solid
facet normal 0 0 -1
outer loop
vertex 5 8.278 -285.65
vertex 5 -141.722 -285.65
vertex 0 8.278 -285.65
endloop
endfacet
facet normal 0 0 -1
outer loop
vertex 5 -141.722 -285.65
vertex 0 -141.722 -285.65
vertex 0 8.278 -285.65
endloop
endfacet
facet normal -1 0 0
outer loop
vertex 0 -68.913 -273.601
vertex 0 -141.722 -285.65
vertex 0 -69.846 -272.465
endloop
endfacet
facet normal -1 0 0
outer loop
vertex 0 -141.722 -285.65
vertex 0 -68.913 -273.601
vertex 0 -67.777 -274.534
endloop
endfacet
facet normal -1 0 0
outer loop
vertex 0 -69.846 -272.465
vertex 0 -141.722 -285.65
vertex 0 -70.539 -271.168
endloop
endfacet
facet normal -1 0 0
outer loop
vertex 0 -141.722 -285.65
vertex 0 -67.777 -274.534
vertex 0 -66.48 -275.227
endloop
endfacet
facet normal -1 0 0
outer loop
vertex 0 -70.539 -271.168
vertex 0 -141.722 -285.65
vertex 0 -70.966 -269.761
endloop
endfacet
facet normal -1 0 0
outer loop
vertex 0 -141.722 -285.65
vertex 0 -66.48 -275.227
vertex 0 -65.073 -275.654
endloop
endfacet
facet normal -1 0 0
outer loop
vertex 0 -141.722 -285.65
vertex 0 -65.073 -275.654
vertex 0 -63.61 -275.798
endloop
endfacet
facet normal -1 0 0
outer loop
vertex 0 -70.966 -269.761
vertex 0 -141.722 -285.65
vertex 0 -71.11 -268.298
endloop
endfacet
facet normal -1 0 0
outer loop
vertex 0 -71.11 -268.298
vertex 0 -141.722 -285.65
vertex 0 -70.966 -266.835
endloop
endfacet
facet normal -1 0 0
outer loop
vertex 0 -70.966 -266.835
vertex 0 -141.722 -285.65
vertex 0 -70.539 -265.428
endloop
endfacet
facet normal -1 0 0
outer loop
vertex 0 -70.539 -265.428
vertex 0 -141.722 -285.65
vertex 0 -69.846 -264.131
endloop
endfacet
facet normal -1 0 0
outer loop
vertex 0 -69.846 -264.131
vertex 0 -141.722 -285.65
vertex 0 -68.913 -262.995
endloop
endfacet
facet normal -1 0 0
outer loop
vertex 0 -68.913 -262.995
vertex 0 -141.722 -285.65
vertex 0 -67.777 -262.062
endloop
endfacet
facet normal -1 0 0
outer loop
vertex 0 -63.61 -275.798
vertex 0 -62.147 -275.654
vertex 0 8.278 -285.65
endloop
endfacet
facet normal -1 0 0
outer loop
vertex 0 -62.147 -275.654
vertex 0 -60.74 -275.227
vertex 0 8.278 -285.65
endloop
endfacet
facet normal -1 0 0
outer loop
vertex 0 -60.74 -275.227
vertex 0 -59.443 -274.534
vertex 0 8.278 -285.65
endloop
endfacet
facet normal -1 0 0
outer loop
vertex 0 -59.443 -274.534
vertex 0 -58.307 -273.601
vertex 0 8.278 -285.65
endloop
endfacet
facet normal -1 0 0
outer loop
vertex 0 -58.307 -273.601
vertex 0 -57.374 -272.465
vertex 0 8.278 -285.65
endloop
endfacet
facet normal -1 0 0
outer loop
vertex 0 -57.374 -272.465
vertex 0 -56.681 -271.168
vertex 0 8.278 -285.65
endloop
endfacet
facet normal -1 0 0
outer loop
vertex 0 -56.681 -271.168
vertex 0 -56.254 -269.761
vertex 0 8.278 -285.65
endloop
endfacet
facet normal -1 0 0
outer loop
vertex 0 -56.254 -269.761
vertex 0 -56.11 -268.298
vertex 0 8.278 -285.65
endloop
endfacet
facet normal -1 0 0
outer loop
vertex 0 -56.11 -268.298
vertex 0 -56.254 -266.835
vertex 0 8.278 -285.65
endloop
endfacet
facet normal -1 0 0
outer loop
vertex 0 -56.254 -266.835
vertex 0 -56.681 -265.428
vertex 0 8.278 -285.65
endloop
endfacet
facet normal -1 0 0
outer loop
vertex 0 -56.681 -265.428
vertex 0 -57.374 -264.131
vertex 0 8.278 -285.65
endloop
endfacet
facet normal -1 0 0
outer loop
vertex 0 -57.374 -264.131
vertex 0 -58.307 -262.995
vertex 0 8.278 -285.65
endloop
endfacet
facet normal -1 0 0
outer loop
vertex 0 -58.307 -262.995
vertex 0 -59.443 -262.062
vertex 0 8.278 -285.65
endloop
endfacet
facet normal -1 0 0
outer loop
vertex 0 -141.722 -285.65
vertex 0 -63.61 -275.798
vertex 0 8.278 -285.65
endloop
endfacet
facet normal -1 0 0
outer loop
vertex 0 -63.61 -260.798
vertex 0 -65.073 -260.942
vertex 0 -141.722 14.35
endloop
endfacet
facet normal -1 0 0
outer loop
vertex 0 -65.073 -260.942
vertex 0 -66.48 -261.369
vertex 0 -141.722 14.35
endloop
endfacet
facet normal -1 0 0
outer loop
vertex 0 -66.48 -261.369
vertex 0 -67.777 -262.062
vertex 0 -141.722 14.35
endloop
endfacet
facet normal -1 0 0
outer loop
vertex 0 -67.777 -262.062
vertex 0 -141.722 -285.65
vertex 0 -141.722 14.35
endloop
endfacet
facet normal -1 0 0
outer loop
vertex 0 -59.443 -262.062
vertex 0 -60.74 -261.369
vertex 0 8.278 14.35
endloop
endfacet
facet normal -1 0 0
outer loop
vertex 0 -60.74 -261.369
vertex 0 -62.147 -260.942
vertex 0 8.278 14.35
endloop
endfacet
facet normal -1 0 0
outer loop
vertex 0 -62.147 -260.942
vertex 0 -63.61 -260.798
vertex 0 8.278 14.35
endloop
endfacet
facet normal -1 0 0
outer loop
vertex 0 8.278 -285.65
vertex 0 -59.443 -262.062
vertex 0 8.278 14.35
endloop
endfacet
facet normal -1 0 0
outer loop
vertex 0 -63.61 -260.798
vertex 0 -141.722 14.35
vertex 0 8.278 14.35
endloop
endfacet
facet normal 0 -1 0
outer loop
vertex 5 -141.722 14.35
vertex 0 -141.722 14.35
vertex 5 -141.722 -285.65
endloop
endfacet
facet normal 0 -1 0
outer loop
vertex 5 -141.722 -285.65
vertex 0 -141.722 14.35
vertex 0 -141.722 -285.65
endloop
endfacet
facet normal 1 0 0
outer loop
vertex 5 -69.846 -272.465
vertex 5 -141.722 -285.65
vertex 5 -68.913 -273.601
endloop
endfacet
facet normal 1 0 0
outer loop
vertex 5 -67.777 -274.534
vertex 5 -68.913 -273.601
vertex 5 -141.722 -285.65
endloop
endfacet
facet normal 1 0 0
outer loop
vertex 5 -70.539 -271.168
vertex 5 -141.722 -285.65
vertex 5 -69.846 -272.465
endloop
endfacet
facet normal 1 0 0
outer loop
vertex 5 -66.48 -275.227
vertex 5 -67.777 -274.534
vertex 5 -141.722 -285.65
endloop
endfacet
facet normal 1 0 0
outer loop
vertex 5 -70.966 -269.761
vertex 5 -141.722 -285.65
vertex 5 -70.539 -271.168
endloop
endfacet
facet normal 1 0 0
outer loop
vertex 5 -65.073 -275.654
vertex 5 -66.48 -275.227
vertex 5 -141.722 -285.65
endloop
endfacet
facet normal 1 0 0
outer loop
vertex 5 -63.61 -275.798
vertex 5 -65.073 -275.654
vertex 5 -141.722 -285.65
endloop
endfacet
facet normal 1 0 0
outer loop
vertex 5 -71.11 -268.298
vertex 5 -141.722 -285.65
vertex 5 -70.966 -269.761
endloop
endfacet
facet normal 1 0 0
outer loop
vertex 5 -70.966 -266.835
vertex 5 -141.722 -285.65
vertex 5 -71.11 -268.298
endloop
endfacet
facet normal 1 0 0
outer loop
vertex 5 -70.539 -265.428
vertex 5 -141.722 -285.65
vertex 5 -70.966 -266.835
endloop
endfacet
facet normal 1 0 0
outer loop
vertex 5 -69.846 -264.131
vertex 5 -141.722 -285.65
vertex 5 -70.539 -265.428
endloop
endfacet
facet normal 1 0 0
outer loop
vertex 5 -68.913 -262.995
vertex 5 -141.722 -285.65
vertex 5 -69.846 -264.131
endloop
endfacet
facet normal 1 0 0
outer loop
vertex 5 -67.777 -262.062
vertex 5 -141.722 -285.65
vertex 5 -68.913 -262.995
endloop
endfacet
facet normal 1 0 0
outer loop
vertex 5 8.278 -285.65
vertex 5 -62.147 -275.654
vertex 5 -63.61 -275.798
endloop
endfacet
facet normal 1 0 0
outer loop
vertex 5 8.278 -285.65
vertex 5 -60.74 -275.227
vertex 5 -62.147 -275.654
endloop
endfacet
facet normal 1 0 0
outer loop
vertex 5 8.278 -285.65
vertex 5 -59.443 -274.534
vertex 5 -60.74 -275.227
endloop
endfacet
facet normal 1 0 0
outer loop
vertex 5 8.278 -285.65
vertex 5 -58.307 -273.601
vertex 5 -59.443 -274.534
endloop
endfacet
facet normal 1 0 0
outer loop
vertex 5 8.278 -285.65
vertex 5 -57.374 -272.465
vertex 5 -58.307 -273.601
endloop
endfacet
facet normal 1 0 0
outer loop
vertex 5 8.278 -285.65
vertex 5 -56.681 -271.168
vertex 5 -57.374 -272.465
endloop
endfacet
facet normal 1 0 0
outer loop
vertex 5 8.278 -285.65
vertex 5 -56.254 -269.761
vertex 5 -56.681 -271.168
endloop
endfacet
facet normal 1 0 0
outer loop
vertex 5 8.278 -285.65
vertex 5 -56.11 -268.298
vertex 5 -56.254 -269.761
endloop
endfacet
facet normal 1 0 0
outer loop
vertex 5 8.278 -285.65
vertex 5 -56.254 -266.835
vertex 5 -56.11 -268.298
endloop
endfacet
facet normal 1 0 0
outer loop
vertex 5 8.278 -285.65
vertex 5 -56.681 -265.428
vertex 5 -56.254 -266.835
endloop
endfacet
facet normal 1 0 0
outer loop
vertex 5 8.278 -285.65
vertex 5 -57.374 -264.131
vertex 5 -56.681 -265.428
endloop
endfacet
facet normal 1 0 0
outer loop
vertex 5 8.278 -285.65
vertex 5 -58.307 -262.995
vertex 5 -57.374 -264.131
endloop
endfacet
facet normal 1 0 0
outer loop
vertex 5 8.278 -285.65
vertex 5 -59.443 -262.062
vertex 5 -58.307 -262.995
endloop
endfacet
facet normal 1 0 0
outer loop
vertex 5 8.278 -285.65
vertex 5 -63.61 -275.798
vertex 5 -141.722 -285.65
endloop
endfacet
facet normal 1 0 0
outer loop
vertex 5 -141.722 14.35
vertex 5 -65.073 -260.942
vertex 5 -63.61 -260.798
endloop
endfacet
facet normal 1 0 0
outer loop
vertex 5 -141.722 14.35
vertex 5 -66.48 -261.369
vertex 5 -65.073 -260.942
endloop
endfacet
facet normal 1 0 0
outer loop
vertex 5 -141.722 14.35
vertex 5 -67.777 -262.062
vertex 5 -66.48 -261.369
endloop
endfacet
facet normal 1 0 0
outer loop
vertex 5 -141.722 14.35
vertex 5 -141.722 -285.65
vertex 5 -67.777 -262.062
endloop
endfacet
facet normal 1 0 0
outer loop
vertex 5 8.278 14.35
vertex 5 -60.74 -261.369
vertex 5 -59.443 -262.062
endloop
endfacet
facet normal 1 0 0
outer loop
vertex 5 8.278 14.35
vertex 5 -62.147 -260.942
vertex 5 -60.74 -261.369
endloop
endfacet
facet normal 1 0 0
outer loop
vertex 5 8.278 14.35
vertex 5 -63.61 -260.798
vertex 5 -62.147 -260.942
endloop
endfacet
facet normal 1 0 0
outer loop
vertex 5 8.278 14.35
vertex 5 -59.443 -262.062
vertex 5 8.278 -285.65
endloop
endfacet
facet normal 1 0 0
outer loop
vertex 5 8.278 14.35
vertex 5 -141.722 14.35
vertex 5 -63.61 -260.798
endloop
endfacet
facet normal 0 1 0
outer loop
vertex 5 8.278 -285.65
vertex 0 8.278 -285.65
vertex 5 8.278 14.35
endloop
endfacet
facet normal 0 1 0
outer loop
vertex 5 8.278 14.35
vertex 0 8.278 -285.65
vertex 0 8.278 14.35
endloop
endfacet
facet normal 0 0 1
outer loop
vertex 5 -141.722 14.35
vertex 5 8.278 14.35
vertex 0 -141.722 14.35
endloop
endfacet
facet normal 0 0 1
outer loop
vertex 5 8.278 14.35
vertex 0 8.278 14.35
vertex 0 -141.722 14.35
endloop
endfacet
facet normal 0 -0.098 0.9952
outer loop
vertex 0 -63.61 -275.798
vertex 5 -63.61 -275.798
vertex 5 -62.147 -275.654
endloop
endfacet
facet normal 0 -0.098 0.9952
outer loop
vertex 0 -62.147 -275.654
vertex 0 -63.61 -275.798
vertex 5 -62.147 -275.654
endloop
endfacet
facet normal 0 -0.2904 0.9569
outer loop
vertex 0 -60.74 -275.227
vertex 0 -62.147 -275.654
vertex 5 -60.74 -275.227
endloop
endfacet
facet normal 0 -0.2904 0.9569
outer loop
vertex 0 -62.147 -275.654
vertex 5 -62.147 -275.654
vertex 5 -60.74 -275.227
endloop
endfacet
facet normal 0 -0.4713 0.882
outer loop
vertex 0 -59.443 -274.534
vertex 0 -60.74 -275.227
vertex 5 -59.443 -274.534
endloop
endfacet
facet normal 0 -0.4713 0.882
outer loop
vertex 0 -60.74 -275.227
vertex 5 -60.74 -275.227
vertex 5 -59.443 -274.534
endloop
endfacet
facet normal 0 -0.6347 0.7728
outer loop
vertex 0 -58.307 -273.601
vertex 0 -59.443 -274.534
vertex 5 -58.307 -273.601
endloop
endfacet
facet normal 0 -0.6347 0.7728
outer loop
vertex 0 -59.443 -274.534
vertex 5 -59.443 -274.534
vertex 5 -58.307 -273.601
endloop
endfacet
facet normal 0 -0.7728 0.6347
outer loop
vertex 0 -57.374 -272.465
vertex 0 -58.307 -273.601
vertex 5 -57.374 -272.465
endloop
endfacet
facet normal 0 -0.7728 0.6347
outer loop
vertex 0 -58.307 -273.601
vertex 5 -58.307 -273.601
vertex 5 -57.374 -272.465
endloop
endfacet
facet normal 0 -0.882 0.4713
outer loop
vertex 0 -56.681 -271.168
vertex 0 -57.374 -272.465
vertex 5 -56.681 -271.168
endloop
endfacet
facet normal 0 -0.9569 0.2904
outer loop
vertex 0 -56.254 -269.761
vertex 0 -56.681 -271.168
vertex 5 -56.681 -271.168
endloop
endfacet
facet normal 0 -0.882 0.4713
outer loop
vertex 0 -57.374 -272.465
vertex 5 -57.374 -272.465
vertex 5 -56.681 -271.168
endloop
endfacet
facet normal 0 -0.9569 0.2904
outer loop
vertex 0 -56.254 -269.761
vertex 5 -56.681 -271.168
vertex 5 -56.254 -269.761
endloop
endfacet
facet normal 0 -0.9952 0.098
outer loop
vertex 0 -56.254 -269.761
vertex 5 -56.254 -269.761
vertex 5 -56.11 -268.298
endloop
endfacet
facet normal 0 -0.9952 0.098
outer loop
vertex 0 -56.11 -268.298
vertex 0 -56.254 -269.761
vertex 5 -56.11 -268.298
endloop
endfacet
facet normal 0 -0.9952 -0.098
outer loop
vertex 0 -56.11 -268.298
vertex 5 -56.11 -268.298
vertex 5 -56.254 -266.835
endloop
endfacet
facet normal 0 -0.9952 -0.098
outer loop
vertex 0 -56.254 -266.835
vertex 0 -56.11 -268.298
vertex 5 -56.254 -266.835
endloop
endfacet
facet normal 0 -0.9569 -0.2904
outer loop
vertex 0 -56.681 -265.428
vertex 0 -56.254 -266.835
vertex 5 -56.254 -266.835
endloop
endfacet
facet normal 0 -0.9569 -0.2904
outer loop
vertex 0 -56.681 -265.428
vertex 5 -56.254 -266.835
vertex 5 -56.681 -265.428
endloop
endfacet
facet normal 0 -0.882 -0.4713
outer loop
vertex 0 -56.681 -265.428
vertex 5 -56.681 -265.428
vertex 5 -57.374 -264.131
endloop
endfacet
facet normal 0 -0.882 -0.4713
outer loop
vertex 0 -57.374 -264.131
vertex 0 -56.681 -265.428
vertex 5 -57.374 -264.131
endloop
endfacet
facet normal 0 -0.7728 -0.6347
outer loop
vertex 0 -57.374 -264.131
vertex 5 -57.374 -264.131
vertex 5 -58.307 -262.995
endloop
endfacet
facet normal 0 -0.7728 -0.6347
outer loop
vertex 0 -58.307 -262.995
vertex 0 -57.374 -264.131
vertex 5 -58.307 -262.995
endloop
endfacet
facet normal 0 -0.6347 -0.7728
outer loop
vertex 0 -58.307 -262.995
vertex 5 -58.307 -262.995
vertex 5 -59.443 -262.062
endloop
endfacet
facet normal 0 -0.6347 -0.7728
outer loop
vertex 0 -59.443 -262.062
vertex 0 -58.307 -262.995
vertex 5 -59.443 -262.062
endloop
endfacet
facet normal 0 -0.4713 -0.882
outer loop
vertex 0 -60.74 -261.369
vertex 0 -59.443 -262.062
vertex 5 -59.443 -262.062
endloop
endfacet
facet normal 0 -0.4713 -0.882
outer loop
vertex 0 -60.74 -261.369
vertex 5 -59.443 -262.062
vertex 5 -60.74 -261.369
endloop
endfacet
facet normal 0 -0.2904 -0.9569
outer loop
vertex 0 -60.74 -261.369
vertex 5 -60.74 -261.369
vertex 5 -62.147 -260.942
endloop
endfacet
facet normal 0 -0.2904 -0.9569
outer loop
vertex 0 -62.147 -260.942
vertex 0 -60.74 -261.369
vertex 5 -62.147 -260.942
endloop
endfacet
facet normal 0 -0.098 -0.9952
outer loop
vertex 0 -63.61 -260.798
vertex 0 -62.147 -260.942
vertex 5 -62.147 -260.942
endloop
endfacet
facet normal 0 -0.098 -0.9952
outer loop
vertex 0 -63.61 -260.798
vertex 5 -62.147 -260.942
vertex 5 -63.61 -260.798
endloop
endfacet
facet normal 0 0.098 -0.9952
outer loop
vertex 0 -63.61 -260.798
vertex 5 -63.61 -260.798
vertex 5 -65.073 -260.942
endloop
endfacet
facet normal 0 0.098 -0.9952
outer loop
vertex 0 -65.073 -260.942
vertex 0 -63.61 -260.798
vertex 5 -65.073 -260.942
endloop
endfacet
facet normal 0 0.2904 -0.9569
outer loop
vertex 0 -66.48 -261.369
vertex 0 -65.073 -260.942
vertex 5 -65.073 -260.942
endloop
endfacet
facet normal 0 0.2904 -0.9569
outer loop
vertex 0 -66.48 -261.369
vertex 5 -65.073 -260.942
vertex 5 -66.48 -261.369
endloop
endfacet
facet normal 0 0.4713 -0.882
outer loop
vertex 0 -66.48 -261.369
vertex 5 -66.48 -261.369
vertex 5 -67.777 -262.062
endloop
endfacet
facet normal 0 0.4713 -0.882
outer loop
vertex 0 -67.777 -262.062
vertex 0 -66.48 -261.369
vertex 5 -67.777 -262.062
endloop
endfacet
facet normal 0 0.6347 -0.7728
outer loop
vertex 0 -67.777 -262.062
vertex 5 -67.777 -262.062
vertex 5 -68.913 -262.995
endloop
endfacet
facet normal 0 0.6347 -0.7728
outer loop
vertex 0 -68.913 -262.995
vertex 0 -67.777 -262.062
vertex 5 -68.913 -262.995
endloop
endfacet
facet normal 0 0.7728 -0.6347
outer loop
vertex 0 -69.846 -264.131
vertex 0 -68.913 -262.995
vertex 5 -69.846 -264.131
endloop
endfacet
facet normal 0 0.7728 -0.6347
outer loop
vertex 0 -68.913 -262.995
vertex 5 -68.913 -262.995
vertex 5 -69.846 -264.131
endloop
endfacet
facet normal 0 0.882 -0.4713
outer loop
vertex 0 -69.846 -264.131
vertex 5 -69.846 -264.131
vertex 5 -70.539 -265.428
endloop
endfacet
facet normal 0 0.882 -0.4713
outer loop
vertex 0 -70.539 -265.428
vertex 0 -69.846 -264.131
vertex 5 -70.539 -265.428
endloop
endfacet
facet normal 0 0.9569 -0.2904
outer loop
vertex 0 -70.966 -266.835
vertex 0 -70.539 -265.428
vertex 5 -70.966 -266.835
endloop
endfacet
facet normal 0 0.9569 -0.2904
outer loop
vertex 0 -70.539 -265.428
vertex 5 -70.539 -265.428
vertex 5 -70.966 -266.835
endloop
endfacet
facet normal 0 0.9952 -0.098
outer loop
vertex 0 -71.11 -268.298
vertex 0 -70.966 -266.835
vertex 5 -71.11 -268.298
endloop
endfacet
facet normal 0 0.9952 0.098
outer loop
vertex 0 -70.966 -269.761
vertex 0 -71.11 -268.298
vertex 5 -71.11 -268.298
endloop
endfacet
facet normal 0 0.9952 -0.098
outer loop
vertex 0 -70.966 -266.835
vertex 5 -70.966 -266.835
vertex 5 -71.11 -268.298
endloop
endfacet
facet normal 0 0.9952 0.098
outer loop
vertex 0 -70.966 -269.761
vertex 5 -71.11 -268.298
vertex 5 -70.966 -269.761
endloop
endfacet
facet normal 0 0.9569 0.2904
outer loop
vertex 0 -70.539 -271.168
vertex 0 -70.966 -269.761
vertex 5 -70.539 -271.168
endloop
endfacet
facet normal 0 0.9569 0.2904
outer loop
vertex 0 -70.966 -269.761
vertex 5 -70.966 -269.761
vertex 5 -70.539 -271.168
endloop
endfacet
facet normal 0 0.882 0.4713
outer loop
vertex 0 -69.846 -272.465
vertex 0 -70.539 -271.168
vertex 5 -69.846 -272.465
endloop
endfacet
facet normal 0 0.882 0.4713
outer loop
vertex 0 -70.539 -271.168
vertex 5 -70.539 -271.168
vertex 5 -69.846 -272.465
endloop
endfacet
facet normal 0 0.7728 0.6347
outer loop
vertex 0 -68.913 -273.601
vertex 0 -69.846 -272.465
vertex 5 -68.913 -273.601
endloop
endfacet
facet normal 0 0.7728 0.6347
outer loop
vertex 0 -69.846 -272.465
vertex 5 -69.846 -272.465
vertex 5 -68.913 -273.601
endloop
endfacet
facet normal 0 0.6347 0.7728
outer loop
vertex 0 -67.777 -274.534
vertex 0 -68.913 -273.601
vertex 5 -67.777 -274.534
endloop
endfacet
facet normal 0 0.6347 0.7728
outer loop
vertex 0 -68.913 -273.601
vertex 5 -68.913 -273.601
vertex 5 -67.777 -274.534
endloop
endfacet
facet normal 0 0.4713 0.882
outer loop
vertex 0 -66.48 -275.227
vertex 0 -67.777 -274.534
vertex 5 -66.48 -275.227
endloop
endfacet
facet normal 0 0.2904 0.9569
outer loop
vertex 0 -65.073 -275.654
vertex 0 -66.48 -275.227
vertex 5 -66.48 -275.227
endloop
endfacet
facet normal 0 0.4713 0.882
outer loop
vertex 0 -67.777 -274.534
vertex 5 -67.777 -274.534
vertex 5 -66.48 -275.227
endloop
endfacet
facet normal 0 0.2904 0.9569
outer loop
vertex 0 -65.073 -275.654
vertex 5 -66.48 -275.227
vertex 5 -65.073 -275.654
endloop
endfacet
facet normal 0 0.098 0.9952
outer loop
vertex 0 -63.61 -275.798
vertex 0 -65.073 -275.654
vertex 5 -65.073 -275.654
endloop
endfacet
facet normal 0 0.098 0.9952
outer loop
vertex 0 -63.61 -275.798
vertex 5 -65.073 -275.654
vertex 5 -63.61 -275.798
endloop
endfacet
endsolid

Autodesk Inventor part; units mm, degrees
ref_plane "YZ Plane" through (0, 0, 0) normal (1, 0, 0) x (0, 1, 0)
ref_plane "XZ Plane" through (0, 0, 0) normal (0, 1, 0) x (-1, 0, 0)
ref_plane "XY Plane" through (0, 0, 0) normal (0, 0, 1) x (1, 0, 0)
sketch "Sketch1" plane through (0, 0, 0) normal (1, 0, 0) x (0, 1, 0)
  line L0 (8.2783, 14.3505) -> (-141.7217, 14.3505)
  line L1 (-141.7217, 14.3505) -> (-141.7217, -285.6495)
  line L2 (-141.7217, -285.6495) -> (8.2783, -285.6495)
  line L3 (8.2783, -285.6495) -> (8.2783, 14.3505)
  point P0 (0, 0)
  dimension "d0" = 150
  dimension "d1" = 300
extrude "Extrusion1" add sketch "Sketch1" along normal blind 5
sketch "Sketch2" plane through (5, 0, 0) normal (1, 0, 0) x (0, 0, -1)
  circle A0 centre (268.2981, -63.61) radius 7.5
  point P0 (0, 0)
  dimension "d4" = 15
extrude "Extrusion2" cut sketch "Sketch2" along normal through all both and the other way through all
properties part number "Uptop2"
